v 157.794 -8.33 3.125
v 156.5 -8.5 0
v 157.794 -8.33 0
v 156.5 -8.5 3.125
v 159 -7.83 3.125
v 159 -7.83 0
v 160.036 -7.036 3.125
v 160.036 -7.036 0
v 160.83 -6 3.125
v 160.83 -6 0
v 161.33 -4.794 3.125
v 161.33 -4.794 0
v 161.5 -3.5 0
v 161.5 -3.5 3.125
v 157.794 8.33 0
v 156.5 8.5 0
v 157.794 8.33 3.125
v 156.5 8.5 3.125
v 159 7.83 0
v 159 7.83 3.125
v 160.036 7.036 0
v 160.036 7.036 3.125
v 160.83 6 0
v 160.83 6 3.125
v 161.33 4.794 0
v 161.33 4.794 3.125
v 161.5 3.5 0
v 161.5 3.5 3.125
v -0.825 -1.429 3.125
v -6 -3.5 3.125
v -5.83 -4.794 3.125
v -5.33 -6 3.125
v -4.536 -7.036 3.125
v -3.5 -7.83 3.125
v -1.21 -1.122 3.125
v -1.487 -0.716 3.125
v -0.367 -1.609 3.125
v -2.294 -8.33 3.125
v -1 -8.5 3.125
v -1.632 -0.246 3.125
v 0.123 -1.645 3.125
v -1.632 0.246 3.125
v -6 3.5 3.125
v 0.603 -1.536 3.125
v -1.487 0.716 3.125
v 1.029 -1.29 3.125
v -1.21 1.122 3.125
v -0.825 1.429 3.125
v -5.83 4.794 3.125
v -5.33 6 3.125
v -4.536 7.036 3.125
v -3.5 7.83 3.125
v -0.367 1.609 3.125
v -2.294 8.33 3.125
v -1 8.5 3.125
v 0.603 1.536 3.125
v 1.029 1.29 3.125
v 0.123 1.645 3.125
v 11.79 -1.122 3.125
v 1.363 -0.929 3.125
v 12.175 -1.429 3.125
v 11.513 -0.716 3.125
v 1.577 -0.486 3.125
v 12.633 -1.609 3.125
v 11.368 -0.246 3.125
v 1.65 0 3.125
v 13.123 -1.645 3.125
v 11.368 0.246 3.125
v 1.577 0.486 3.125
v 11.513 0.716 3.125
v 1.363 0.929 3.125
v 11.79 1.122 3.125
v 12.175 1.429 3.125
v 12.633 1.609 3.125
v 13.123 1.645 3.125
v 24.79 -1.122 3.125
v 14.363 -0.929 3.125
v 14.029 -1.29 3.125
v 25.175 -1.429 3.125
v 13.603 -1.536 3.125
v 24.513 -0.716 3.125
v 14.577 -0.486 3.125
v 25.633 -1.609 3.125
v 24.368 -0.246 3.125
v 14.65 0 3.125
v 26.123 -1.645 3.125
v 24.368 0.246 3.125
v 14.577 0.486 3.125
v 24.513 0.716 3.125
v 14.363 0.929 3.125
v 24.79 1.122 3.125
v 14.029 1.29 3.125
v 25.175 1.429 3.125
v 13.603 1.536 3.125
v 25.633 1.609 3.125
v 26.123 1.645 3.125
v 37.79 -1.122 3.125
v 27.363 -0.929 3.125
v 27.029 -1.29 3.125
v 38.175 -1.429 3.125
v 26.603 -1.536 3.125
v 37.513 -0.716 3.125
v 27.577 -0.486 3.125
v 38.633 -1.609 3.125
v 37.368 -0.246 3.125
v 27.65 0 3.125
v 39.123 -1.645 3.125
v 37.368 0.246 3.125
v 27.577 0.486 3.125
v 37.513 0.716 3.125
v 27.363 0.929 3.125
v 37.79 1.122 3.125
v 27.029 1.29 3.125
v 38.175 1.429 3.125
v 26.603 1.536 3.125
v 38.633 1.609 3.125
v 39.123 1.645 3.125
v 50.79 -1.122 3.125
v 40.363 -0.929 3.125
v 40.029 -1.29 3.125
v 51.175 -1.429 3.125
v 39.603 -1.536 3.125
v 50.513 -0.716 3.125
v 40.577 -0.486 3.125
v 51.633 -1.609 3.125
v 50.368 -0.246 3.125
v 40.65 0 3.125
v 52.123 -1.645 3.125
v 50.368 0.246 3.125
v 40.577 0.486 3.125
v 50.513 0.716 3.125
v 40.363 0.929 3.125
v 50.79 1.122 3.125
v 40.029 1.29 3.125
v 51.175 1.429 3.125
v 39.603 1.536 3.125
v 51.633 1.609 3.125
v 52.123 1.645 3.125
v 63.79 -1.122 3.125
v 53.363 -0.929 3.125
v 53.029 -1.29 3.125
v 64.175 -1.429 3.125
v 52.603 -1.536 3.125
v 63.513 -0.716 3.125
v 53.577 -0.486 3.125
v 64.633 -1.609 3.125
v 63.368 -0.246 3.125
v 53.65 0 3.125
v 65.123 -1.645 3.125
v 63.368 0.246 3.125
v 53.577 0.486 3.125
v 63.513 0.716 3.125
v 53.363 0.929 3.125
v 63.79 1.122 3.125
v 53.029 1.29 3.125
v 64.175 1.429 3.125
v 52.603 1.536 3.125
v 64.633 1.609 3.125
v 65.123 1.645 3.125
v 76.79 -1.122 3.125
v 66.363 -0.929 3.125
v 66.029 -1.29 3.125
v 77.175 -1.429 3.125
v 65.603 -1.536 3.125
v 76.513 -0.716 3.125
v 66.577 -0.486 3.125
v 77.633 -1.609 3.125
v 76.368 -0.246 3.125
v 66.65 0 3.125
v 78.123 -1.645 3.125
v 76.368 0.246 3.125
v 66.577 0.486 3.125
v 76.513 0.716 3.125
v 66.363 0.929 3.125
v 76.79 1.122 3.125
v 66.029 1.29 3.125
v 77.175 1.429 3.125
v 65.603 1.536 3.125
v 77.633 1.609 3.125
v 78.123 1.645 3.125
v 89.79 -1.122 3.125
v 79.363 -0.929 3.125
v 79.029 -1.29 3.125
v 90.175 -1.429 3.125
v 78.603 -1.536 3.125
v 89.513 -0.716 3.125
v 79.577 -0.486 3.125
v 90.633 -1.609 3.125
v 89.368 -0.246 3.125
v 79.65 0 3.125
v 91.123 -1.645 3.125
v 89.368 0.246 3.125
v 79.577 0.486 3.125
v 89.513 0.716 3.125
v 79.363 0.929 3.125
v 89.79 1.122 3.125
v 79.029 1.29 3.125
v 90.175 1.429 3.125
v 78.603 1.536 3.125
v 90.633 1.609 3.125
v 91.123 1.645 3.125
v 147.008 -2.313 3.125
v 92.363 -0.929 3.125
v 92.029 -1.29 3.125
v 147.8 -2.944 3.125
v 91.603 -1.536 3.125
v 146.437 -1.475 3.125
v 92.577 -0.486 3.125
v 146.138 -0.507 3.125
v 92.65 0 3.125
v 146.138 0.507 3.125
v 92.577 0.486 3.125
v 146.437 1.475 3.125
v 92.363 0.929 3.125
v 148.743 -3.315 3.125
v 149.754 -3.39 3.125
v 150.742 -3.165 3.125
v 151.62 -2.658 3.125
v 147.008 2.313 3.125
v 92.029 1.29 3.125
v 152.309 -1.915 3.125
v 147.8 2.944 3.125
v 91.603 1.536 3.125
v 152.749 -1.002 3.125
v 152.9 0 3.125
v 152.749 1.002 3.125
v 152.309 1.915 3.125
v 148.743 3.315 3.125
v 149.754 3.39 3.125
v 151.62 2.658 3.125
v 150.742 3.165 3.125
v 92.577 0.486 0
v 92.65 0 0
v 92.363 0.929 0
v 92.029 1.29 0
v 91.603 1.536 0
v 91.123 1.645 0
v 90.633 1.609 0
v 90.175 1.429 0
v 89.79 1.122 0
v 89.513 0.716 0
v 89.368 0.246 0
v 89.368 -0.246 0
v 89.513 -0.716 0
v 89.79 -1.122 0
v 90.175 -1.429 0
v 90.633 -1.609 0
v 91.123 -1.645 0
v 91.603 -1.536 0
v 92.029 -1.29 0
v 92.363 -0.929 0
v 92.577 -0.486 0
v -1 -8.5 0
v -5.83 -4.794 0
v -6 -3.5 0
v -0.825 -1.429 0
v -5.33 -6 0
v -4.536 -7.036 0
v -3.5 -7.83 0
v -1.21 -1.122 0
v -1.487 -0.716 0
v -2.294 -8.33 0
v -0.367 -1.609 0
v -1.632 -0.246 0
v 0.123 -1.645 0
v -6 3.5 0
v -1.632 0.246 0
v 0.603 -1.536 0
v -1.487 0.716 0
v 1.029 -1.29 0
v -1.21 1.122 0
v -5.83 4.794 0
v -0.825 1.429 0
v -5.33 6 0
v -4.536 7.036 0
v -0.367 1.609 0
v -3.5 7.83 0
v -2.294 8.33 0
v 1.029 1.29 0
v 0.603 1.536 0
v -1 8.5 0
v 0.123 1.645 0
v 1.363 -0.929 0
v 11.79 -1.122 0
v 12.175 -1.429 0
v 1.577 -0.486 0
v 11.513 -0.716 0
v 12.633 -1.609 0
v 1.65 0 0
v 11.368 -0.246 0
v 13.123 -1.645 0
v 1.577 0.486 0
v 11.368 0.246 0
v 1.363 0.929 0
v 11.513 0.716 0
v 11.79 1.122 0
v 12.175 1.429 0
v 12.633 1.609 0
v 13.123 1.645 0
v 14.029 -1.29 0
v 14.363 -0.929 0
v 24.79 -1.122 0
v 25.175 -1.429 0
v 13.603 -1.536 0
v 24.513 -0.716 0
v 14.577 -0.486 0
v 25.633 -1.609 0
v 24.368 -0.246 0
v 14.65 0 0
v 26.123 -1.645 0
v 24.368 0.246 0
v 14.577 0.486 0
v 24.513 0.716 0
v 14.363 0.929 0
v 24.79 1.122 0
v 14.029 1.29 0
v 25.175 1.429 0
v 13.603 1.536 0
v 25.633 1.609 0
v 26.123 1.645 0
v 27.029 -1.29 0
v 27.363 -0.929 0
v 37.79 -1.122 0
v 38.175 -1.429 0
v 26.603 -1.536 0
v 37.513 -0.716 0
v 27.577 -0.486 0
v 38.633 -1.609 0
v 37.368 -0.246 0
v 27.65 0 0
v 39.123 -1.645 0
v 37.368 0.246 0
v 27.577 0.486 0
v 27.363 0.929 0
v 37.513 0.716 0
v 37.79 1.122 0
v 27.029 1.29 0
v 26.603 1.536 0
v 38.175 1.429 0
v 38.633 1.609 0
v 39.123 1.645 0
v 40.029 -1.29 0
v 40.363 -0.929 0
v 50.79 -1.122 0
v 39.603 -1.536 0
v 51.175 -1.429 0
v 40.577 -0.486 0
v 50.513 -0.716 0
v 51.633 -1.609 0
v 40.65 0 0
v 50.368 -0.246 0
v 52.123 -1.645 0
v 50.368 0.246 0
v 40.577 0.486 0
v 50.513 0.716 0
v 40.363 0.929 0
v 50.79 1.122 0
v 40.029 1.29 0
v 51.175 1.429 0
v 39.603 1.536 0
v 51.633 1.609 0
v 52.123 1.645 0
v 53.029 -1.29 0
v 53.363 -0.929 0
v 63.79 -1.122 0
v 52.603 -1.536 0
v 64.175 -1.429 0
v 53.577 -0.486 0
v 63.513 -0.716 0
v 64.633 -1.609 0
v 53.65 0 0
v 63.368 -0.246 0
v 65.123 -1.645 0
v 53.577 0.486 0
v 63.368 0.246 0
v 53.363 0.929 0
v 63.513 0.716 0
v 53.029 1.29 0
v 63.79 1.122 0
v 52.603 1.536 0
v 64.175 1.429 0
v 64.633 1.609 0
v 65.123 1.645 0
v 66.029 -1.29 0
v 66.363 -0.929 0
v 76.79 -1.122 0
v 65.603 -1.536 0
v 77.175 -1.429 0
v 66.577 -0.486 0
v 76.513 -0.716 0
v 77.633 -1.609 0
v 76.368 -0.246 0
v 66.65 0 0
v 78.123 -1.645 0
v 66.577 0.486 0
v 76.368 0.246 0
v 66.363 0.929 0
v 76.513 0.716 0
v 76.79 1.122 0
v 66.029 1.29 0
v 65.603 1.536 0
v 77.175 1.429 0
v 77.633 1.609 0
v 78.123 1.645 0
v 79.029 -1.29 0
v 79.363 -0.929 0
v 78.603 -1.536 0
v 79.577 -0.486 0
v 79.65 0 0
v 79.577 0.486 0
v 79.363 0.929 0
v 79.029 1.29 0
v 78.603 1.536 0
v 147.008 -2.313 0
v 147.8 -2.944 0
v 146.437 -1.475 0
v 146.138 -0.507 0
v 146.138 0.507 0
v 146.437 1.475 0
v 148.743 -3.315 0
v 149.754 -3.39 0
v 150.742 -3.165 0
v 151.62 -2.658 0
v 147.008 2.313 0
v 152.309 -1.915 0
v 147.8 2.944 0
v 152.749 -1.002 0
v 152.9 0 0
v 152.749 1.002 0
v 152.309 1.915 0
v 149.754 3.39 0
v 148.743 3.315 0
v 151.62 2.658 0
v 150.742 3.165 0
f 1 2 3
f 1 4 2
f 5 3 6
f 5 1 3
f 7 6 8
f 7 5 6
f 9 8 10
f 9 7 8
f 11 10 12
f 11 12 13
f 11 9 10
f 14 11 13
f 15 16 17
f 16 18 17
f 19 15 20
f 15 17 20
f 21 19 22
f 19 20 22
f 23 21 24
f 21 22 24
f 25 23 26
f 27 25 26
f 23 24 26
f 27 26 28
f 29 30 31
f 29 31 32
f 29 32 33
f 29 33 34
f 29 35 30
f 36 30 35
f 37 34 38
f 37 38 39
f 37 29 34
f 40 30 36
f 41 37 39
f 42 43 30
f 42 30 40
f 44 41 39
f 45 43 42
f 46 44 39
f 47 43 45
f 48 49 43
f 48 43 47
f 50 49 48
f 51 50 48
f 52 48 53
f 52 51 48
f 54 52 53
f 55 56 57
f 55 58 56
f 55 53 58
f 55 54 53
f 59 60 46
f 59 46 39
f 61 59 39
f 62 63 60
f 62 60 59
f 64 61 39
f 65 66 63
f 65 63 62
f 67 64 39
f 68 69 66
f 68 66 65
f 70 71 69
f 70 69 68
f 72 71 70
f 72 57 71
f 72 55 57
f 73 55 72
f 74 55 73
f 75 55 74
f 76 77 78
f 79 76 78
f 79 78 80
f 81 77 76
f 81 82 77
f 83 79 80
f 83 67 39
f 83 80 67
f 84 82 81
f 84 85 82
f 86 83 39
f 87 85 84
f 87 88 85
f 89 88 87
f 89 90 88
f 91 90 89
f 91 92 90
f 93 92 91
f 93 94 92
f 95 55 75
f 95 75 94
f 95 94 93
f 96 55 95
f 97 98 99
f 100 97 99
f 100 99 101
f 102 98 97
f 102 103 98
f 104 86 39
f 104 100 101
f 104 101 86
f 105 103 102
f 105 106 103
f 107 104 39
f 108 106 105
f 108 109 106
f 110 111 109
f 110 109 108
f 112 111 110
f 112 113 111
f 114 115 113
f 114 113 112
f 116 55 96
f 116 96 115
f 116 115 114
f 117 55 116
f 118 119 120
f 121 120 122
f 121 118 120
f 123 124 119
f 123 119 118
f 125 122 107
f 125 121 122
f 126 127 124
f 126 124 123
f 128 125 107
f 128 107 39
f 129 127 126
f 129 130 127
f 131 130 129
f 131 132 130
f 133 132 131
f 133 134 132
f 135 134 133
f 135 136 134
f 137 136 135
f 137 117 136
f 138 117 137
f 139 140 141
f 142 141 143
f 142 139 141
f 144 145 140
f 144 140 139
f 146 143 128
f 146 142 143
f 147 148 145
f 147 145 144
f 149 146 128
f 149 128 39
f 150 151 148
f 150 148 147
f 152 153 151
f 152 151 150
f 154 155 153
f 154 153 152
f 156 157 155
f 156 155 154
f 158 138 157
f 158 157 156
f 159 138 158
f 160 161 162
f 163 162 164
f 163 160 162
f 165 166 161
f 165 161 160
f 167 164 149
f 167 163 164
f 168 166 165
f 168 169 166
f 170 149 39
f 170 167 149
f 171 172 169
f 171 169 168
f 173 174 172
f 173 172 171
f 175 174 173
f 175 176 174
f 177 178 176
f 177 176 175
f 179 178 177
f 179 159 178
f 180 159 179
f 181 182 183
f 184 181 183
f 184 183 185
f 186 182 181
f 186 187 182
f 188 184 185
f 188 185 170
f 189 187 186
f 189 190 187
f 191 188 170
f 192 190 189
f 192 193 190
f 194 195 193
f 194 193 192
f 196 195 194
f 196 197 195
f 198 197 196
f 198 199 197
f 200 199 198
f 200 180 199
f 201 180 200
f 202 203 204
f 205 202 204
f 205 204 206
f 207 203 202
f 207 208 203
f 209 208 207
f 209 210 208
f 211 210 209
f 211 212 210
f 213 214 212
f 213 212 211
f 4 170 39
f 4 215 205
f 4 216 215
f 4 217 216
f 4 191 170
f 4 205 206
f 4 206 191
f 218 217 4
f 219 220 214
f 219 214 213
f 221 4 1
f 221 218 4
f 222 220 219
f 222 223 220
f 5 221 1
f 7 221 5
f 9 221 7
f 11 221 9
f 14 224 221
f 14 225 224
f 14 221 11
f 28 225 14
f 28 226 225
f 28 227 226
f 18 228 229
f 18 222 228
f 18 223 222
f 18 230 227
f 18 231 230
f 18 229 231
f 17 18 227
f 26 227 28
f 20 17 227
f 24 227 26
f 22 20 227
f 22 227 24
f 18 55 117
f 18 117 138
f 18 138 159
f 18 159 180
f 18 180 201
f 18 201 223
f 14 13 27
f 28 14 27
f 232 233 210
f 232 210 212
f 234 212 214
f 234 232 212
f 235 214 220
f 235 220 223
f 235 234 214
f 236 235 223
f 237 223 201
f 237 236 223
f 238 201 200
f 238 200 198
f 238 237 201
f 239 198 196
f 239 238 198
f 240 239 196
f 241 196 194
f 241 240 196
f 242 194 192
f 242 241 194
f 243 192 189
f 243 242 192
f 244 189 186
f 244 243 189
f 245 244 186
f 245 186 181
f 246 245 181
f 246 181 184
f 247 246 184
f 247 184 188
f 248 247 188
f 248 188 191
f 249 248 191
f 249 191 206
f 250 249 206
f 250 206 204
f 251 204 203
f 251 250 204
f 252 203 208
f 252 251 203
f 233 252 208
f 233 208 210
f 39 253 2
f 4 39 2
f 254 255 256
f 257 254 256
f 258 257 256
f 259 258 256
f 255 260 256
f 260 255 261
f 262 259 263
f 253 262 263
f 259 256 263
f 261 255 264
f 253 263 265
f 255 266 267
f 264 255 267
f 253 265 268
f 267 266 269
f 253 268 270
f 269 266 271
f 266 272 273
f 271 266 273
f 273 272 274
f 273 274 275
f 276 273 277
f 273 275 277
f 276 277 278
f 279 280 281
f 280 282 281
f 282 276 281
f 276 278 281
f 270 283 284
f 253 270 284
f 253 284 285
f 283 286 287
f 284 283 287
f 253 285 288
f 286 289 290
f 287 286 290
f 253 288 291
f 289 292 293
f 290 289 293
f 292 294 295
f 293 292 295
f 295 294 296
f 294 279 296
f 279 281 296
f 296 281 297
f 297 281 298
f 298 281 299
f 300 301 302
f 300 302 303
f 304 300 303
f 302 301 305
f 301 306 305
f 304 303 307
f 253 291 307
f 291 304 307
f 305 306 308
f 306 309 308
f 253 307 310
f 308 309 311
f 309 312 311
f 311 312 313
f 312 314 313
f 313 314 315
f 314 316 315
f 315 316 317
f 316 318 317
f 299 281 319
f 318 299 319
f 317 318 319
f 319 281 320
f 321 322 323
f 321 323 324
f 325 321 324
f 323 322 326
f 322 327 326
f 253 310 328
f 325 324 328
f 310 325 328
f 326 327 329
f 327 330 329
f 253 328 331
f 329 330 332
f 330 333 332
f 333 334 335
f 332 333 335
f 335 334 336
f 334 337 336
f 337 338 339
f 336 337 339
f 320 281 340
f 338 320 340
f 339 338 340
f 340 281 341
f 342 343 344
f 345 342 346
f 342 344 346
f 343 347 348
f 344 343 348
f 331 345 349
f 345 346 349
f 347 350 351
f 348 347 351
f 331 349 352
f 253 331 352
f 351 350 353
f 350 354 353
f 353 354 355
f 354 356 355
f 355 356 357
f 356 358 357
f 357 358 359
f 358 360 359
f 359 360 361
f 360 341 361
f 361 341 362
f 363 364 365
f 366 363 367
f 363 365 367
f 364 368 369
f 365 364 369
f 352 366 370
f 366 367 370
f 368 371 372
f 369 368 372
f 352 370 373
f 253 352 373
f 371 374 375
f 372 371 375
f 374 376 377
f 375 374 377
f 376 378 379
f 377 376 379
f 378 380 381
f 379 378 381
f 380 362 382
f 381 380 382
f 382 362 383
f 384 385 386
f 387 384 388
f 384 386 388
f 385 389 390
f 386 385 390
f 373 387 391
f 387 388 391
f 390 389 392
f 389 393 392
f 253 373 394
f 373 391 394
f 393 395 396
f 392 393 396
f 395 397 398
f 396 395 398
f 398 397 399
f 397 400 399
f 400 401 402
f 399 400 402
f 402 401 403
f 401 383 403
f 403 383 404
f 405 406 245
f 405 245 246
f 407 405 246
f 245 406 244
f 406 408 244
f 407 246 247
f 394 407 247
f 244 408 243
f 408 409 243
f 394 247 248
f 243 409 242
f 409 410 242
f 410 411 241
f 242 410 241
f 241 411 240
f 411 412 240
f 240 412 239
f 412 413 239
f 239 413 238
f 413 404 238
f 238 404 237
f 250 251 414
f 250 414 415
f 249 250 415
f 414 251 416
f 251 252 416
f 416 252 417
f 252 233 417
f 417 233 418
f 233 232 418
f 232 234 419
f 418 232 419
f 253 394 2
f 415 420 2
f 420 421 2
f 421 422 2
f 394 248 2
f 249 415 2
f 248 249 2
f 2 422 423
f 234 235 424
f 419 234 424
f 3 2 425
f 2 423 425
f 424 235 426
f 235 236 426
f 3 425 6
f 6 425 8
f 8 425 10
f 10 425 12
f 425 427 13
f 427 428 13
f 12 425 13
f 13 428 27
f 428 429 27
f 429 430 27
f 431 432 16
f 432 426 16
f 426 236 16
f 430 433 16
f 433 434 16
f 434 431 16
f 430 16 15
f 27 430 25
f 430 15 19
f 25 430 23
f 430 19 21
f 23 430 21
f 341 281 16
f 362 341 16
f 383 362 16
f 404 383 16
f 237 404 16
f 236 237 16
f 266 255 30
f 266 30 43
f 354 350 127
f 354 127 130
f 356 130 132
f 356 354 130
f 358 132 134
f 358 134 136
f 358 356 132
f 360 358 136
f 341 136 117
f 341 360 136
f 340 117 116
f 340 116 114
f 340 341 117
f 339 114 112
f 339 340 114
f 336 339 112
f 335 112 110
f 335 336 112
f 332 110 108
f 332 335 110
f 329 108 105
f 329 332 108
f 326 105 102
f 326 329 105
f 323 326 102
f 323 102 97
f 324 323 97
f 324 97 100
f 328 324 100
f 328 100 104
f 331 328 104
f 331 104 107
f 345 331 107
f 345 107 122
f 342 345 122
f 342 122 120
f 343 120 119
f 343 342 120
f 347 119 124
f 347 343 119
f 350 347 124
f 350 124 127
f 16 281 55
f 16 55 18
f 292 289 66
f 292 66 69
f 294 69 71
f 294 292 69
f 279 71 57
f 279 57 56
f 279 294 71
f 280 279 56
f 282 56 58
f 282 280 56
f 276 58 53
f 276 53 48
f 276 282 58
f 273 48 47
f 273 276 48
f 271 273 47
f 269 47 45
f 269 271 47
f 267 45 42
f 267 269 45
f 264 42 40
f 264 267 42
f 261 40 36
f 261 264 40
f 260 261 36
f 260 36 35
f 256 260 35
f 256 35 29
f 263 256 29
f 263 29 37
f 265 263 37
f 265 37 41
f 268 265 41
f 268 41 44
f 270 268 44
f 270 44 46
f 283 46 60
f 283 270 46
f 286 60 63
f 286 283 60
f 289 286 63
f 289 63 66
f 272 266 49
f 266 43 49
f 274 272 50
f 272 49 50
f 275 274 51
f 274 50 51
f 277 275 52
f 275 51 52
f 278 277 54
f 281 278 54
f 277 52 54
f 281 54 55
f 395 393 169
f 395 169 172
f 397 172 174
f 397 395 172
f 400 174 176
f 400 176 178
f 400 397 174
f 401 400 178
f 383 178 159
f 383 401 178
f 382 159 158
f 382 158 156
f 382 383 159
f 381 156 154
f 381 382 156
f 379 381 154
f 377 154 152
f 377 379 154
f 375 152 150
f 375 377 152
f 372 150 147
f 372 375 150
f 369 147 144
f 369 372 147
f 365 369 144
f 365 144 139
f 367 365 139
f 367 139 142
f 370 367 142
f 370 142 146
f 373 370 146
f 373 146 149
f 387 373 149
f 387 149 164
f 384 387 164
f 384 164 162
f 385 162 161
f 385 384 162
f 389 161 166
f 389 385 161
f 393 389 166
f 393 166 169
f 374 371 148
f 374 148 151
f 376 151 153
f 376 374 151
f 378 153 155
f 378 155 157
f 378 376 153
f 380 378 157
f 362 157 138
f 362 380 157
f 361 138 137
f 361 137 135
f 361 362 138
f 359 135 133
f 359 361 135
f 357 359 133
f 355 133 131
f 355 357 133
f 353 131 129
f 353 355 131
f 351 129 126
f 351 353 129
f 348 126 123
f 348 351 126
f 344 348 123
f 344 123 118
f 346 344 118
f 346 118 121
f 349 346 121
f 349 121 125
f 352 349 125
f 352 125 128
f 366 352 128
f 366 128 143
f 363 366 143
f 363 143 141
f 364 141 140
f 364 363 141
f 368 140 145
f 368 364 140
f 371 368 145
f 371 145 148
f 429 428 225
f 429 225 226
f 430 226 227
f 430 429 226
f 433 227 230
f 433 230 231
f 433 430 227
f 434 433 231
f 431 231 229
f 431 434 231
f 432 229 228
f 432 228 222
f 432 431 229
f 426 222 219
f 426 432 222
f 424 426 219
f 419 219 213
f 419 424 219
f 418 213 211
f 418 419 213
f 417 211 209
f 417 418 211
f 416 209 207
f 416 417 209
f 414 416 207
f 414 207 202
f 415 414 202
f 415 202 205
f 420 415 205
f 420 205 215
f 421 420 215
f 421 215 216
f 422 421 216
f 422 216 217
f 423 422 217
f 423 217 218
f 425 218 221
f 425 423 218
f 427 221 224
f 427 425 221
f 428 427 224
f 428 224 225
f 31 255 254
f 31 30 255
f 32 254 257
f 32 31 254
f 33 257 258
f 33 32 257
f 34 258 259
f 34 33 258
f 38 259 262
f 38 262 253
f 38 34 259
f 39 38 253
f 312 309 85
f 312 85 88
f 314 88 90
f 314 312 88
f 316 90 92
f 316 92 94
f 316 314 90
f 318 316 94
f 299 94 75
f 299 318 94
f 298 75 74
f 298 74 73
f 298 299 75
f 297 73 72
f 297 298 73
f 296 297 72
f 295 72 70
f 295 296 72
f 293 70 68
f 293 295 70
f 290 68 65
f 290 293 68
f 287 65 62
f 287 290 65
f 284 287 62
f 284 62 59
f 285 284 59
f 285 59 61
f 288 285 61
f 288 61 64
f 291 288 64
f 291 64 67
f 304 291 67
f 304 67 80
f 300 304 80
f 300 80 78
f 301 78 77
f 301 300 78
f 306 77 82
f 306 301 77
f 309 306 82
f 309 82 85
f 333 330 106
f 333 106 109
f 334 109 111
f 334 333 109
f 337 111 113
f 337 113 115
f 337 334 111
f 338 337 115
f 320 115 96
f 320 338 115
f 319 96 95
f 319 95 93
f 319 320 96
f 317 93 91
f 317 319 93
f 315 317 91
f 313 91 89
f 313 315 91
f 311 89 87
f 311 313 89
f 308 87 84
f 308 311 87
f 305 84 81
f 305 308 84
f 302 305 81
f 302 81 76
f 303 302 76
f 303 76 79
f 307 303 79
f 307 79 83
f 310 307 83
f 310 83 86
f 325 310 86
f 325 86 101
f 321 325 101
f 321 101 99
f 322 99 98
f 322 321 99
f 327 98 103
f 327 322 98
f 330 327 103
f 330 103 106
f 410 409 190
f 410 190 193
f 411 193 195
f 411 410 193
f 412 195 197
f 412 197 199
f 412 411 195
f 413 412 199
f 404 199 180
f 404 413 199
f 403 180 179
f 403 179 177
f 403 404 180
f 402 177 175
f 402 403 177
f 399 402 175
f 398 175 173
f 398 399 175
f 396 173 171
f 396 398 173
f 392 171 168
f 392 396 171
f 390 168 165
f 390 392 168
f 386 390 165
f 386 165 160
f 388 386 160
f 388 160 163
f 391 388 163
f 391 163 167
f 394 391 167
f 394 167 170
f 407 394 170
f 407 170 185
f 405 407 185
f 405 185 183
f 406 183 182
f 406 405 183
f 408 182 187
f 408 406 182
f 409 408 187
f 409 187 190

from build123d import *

# Parameters (mm, degrees)
SKETCH_W   = 167.5
SKETCH_H   = 17
SKETCH_R   = 1.65
SKETCH_R_2 = 3.4
PAD_DEPTH  = 3.125
FILLET_R   = 5


with BuildPart() as part:
    # Sketch → Pad (new body)
    with BuildSketch(Plane.XY):
        with Locations((77.75, 0)):
            Rectangle(SKETCH_W, SKETCH_H)
        Circle(SKETCH_R, mode=Mode.SUBTRACT)
        with Locations((13, 0)):
            Circle(SKETCH_R, mode=Mode.SUBTRACT)
        with Locations((26, 0)):
            Circle(SKETCH_R, mode=Mode.SUBTRACT)
        with Locations((39, 0)):
            Circle(SKETCH_R, mode=Mode.SUBTRACT)
        with Locations((52, 0)):
            Circle(SKETCH_R, mode=Mode.SUBTRACT)
        with Locations((65, 0)):
            Circle(SKETCH_R, mode=Mode.SUBTRACT)
        with Locations((91, 0)):
            Circle(SKETCH_R, mode=Mode.SUBTRACT)
        with Locations((78, 0)):
            Circle(SKETCH_R, mode=Mode.SUBTRACT)
        with Locations((149.5, 0)):
            Circle(SKETCH_R_2, mode=Mode.SUBTRACT)
    extrude(amount=PAD_DEPTH)

    # Fillet
    fillet_edges = [part.edges().sort_by_distance(p)[0] for p in [
        (-6, -8.5, 1.5625),
        (161.5, -8.5, 1.5625),
        (161.5, 8.5, 1.5625),
        (-6, 8.5, 1.5625),
    ]]
    fillet(fillet_edges, radius=FILLET_R)


solid = part.part
